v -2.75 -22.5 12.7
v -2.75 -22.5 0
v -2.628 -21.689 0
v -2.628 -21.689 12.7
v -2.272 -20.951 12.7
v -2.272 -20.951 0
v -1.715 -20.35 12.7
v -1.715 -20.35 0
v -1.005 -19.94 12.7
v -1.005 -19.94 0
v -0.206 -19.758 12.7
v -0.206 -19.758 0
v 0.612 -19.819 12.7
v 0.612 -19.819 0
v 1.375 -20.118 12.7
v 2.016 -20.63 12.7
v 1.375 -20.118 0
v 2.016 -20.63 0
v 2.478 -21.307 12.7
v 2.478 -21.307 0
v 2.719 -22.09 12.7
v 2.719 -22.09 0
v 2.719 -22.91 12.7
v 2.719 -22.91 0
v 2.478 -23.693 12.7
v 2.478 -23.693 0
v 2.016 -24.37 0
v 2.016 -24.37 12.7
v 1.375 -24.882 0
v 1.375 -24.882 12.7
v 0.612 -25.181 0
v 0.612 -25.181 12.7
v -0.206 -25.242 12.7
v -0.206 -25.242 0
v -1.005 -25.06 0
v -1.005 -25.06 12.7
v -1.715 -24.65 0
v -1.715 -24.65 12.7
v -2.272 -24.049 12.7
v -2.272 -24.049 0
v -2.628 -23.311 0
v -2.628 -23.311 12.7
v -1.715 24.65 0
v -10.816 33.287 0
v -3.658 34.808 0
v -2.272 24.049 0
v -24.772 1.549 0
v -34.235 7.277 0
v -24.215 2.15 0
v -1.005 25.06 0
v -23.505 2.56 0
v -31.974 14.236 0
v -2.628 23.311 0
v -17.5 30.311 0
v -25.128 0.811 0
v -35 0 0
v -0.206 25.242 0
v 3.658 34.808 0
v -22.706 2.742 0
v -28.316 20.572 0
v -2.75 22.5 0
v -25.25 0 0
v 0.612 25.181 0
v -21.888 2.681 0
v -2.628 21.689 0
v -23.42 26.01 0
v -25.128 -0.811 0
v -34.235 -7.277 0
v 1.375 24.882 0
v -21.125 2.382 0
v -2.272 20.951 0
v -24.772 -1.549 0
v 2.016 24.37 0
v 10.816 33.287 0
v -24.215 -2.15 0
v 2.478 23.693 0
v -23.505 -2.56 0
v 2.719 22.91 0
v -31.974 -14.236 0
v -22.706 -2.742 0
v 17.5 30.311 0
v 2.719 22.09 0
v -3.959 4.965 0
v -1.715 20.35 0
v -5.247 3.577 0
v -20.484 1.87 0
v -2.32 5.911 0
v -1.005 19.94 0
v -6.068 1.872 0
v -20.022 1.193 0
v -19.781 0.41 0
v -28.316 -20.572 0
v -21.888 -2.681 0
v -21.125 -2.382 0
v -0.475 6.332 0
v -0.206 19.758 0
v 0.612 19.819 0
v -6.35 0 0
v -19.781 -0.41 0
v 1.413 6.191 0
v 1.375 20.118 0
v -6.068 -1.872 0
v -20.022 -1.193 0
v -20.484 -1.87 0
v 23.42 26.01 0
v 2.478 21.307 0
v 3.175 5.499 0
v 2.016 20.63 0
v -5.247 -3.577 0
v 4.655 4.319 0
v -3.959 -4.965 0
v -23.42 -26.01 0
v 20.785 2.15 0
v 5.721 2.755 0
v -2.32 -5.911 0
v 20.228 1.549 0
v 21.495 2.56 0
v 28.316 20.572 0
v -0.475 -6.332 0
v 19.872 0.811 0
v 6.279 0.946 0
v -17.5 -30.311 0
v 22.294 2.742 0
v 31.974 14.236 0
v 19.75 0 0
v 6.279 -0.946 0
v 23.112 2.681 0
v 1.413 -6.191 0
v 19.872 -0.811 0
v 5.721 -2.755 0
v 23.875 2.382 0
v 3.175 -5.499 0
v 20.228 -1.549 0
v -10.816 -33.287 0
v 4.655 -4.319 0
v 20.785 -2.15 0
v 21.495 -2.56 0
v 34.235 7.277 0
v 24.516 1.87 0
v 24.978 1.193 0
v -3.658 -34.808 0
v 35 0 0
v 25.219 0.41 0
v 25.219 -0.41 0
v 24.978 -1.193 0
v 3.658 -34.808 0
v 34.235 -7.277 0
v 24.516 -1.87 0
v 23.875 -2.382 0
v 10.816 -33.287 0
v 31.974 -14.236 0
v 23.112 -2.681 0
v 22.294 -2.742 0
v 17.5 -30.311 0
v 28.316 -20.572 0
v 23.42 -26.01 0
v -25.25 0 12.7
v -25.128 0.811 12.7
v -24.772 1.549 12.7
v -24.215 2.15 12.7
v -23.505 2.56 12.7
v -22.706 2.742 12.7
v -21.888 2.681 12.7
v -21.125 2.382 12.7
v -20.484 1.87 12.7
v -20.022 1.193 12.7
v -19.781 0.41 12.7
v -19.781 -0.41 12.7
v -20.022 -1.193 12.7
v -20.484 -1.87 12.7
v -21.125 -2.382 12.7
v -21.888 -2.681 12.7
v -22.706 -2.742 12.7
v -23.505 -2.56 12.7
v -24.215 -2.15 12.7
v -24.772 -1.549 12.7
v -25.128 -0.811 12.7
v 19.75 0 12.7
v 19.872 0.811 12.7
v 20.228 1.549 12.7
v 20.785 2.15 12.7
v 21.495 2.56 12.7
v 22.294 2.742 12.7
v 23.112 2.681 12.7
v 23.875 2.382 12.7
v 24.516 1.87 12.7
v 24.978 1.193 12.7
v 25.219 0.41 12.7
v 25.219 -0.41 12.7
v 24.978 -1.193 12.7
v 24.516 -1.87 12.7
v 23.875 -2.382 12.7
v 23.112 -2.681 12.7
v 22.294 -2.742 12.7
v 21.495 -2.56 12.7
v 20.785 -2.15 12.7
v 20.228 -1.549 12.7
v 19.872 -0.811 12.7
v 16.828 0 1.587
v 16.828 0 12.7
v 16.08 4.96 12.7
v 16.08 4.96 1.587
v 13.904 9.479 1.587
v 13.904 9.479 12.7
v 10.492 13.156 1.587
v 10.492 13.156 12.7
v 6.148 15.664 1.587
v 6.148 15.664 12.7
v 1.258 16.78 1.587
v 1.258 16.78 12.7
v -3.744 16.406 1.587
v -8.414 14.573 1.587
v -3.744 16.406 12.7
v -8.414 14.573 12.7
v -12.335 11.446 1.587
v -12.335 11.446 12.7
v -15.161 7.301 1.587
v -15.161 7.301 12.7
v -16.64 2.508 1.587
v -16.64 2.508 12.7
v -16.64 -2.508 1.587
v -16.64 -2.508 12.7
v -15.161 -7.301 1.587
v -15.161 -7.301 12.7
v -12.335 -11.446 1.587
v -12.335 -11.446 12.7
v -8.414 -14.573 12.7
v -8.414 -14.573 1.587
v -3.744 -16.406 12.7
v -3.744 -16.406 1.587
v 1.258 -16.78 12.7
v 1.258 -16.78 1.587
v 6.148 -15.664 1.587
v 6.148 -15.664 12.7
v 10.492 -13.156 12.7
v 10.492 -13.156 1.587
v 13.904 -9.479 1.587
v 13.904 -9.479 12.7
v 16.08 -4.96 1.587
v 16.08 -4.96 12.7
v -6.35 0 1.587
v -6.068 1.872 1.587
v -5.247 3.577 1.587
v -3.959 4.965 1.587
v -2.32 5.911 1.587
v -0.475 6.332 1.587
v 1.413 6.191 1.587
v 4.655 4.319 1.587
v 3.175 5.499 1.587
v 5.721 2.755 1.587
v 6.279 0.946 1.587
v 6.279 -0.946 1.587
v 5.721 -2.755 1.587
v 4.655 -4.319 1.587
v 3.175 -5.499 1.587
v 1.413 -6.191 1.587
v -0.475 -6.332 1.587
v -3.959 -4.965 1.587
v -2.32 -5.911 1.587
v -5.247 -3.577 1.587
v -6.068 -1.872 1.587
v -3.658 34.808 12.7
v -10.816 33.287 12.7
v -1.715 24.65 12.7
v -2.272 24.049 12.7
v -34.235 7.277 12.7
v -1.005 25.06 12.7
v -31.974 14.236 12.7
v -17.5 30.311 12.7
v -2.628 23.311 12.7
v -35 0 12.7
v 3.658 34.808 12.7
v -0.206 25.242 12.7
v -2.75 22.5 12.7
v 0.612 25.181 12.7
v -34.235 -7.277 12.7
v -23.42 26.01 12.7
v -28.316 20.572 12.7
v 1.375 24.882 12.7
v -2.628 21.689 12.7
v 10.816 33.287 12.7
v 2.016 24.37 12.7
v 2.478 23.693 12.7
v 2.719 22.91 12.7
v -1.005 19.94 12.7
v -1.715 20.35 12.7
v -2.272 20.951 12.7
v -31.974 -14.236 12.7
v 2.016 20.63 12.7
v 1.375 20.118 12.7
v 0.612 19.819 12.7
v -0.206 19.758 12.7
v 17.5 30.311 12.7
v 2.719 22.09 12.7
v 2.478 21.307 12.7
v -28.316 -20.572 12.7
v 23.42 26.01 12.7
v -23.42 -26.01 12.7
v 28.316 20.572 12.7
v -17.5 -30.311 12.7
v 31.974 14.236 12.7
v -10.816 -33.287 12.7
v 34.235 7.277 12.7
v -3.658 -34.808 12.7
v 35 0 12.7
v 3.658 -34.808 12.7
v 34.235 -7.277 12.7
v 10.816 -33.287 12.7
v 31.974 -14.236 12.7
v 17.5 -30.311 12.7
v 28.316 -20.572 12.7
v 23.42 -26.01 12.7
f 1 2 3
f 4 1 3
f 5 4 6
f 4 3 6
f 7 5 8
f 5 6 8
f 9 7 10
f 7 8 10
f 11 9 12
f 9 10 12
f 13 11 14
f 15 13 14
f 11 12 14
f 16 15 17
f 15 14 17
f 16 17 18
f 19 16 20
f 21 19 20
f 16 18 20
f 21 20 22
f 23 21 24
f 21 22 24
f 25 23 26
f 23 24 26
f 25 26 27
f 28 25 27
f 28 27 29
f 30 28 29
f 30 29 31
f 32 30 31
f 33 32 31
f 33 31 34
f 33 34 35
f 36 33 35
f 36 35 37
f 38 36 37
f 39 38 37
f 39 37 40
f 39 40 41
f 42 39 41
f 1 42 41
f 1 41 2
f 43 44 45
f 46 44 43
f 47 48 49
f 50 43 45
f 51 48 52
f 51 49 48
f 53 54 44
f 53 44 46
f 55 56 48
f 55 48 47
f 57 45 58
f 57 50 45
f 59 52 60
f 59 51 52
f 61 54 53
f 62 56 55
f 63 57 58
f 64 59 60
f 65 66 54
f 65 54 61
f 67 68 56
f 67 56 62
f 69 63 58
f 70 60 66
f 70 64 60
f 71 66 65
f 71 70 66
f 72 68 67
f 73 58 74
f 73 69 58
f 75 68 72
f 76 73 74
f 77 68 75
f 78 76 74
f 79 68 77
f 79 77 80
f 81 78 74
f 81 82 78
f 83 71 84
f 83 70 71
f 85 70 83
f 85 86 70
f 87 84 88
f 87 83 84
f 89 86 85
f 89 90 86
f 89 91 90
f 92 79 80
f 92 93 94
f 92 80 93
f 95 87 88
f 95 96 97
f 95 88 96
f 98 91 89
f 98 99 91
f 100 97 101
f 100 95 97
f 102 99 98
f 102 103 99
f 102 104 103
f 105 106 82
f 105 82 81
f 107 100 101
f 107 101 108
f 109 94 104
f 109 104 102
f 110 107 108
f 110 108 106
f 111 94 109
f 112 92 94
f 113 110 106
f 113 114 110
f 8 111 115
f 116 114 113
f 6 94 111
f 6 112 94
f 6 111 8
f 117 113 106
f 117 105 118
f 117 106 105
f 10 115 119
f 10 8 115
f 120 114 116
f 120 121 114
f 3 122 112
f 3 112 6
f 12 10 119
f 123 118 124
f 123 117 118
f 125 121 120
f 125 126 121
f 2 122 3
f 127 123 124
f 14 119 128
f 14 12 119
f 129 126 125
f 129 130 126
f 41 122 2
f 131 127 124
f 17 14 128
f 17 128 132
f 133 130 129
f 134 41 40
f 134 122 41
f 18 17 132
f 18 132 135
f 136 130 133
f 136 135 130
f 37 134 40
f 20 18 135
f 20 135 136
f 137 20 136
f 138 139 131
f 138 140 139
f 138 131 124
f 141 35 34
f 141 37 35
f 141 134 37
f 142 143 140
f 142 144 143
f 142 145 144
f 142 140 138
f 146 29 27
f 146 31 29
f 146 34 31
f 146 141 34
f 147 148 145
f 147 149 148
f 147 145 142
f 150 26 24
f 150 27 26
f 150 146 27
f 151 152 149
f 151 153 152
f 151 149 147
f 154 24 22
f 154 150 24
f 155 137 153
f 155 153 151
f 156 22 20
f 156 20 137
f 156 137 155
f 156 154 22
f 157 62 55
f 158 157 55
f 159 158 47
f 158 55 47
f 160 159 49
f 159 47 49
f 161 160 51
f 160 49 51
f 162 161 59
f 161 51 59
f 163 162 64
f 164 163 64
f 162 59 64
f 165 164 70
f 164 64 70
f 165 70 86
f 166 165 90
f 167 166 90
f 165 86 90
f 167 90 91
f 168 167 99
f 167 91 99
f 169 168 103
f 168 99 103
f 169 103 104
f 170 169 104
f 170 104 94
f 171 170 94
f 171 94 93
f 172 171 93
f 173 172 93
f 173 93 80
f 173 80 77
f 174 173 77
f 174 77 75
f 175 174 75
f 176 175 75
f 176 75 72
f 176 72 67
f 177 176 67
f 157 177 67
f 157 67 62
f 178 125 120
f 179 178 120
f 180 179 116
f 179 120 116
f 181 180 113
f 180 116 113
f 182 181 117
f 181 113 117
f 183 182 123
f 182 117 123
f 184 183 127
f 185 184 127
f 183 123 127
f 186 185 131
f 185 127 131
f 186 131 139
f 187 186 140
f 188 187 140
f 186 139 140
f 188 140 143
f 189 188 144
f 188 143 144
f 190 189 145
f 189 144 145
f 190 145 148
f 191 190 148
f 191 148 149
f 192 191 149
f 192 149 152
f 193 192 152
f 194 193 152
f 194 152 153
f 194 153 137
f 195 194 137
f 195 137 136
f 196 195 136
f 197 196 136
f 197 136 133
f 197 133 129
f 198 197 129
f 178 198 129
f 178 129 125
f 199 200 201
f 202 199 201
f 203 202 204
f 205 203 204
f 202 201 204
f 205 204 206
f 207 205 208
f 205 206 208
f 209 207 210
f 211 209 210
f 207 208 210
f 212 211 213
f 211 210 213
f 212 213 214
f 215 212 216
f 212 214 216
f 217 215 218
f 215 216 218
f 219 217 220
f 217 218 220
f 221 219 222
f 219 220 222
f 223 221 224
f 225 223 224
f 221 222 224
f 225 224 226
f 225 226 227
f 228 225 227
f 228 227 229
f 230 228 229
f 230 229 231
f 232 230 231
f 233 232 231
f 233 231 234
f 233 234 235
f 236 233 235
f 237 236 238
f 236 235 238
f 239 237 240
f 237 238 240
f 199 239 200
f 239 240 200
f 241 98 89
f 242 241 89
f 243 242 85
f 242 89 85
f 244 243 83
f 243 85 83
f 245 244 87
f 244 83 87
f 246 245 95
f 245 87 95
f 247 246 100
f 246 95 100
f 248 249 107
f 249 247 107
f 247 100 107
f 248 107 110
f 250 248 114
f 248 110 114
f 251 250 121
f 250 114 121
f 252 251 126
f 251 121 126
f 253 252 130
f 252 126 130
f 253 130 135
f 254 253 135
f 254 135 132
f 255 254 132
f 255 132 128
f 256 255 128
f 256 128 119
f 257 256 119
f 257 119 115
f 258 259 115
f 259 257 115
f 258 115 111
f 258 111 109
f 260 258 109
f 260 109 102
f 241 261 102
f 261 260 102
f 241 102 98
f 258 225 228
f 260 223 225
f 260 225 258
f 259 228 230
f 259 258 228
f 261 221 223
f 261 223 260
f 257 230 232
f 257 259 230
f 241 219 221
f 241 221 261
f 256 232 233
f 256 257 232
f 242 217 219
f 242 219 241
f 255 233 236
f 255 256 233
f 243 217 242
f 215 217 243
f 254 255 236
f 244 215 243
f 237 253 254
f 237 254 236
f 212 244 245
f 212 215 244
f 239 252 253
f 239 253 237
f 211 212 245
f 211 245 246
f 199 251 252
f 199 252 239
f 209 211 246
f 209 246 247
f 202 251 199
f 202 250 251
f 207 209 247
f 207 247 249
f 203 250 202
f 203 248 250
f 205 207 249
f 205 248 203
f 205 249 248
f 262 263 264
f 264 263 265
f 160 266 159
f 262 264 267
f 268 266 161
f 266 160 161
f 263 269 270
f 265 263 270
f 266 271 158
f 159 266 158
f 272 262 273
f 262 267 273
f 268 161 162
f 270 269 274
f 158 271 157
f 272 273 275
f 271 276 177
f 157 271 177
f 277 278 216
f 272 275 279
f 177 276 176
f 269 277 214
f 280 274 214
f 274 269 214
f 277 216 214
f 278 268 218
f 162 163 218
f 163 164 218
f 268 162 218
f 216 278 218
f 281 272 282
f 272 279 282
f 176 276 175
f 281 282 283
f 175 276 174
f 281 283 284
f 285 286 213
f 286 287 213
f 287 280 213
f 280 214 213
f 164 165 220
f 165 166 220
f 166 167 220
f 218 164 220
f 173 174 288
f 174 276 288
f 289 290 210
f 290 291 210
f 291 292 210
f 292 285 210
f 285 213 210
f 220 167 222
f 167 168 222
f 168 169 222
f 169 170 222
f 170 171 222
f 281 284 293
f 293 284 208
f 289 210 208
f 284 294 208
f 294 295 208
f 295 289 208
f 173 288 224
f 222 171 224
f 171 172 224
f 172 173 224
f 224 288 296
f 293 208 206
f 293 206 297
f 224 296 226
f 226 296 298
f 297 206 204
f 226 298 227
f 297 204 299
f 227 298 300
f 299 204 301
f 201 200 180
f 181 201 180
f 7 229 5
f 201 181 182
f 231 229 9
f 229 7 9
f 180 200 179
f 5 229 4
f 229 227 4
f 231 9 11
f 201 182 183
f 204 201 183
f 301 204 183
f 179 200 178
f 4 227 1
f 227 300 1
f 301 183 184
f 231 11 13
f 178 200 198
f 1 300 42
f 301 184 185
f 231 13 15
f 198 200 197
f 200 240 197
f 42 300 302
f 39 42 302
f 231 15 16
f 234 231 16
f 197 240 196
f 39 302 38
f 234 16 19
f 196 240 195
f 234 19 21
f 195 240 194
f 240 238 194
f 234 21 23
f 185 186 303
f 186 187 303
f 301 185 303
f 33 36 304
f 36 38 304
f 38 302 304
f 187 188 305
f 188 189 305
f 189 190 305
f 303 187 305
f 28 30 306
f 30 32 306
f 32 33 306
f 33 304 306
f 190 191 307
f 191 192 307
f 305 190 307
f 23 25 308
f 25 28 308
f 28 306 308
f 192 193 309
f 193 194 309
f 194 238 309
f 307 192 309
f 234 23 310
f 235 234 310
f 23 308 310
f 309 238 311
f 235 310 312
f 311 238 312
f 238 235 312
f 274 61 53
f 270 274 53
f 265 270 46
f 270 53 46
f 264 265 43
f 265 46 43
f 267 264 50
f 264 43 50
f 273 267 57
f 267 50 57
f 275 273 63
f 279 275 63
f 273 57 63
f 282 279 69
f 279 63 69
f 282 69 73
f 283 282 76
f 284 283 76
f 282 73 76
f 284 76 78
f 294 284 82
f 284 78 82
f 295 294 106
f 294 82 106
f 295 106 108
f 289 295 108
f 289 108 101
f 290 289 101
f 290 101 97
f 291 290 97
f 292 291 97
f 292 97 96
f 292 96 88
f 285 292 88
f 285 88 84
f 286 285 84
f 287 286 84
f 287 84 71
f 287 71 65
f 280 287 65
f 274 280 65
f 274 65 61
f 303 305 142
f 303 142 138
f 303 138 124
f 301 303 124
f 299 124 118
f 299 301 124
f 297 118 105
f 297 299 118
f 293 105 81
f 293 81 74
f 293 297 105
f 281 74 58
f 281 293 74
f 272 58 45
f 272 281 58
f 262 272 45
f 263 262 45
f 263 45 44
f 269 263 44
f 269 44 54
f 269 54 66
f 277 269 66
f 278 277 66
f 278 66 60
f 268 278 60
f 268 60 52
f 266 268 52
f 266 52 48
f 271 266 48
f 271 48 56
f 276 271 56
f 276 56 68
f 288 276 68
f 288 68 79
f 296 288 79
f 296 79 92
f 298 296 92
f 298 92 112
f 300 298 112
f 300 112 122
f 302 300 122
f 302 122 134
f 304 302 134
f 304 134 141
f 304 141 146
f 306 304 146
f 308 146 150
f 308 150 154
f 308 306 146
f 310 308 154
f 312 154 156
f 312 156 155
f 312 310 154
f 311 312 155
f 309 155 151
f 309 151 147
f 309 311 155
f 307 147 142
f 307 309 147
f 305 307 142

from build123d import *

# Parameters (mm, degrees)
F0_W           = 92.075
F0_H           = 12.7
F1_DEPTH       = 46.0375
F2_R           = 16.8275
F3_DEPTH       = 11.1125
F4_D           = 5.5
F5_R           = 35
F5_R_2         = 16.8275
F6_DEPTH       = 25.4
F7_D           = 12.7
F7_CBORE_D     = 12.7
F7_CBORE_DEPTH = 6.35


# Not quite as in the source:
# - a length typed as a fraction of an inch, garbled in the dataset ("3 / 203.2 mm" for 3/8 in), is restored


with BuildPart() as f1:
    # F0 (on Front) → F1 (new body, symmetric)
    with BuildSketch(Plane.XZ):
        with Locations((7.9375, 6.35)):
            Rectangle(F0_W, F0_H)
    extrude(amount=F1_DEPTH, both=True)

    # F2 (on face) → F3 (cut)
    with BuildSketch(Plane.XY.offset(12.7)):
        Circle(F2_R)
    extrude(amount=-F3_DEPTH, mode=Mode.SUBTRACT)

    # F4 (through all)
    with Locations(Plane.XY.offset(12.7)):
        with Locations((0, 22.5), (22.5, 0), (0, -22.5), (-22.5, 0)):
            Hole(F4_D / 2)

    # F5 (on face) → F6 (intersect)
    with BuildSketch(Plane.XY.offset(12.7)):
        Circle(F5_R)
        Circle(F5_R_2, mode=Mode.SUBTRACT)
        Circle(F5_R_2)
    extrude(amount=-F6_DEPTH, mode=Mode.INTERSECT)

    # F7 (through all)
    with Locations(Plane.XY.offset(12.7)):
        with Locations((0, 0)):
            CounterBoreHole(F7_D / 2, F7_CBORE_D / 2, F7_CBORE_DEPTH)


solid = f1.part
